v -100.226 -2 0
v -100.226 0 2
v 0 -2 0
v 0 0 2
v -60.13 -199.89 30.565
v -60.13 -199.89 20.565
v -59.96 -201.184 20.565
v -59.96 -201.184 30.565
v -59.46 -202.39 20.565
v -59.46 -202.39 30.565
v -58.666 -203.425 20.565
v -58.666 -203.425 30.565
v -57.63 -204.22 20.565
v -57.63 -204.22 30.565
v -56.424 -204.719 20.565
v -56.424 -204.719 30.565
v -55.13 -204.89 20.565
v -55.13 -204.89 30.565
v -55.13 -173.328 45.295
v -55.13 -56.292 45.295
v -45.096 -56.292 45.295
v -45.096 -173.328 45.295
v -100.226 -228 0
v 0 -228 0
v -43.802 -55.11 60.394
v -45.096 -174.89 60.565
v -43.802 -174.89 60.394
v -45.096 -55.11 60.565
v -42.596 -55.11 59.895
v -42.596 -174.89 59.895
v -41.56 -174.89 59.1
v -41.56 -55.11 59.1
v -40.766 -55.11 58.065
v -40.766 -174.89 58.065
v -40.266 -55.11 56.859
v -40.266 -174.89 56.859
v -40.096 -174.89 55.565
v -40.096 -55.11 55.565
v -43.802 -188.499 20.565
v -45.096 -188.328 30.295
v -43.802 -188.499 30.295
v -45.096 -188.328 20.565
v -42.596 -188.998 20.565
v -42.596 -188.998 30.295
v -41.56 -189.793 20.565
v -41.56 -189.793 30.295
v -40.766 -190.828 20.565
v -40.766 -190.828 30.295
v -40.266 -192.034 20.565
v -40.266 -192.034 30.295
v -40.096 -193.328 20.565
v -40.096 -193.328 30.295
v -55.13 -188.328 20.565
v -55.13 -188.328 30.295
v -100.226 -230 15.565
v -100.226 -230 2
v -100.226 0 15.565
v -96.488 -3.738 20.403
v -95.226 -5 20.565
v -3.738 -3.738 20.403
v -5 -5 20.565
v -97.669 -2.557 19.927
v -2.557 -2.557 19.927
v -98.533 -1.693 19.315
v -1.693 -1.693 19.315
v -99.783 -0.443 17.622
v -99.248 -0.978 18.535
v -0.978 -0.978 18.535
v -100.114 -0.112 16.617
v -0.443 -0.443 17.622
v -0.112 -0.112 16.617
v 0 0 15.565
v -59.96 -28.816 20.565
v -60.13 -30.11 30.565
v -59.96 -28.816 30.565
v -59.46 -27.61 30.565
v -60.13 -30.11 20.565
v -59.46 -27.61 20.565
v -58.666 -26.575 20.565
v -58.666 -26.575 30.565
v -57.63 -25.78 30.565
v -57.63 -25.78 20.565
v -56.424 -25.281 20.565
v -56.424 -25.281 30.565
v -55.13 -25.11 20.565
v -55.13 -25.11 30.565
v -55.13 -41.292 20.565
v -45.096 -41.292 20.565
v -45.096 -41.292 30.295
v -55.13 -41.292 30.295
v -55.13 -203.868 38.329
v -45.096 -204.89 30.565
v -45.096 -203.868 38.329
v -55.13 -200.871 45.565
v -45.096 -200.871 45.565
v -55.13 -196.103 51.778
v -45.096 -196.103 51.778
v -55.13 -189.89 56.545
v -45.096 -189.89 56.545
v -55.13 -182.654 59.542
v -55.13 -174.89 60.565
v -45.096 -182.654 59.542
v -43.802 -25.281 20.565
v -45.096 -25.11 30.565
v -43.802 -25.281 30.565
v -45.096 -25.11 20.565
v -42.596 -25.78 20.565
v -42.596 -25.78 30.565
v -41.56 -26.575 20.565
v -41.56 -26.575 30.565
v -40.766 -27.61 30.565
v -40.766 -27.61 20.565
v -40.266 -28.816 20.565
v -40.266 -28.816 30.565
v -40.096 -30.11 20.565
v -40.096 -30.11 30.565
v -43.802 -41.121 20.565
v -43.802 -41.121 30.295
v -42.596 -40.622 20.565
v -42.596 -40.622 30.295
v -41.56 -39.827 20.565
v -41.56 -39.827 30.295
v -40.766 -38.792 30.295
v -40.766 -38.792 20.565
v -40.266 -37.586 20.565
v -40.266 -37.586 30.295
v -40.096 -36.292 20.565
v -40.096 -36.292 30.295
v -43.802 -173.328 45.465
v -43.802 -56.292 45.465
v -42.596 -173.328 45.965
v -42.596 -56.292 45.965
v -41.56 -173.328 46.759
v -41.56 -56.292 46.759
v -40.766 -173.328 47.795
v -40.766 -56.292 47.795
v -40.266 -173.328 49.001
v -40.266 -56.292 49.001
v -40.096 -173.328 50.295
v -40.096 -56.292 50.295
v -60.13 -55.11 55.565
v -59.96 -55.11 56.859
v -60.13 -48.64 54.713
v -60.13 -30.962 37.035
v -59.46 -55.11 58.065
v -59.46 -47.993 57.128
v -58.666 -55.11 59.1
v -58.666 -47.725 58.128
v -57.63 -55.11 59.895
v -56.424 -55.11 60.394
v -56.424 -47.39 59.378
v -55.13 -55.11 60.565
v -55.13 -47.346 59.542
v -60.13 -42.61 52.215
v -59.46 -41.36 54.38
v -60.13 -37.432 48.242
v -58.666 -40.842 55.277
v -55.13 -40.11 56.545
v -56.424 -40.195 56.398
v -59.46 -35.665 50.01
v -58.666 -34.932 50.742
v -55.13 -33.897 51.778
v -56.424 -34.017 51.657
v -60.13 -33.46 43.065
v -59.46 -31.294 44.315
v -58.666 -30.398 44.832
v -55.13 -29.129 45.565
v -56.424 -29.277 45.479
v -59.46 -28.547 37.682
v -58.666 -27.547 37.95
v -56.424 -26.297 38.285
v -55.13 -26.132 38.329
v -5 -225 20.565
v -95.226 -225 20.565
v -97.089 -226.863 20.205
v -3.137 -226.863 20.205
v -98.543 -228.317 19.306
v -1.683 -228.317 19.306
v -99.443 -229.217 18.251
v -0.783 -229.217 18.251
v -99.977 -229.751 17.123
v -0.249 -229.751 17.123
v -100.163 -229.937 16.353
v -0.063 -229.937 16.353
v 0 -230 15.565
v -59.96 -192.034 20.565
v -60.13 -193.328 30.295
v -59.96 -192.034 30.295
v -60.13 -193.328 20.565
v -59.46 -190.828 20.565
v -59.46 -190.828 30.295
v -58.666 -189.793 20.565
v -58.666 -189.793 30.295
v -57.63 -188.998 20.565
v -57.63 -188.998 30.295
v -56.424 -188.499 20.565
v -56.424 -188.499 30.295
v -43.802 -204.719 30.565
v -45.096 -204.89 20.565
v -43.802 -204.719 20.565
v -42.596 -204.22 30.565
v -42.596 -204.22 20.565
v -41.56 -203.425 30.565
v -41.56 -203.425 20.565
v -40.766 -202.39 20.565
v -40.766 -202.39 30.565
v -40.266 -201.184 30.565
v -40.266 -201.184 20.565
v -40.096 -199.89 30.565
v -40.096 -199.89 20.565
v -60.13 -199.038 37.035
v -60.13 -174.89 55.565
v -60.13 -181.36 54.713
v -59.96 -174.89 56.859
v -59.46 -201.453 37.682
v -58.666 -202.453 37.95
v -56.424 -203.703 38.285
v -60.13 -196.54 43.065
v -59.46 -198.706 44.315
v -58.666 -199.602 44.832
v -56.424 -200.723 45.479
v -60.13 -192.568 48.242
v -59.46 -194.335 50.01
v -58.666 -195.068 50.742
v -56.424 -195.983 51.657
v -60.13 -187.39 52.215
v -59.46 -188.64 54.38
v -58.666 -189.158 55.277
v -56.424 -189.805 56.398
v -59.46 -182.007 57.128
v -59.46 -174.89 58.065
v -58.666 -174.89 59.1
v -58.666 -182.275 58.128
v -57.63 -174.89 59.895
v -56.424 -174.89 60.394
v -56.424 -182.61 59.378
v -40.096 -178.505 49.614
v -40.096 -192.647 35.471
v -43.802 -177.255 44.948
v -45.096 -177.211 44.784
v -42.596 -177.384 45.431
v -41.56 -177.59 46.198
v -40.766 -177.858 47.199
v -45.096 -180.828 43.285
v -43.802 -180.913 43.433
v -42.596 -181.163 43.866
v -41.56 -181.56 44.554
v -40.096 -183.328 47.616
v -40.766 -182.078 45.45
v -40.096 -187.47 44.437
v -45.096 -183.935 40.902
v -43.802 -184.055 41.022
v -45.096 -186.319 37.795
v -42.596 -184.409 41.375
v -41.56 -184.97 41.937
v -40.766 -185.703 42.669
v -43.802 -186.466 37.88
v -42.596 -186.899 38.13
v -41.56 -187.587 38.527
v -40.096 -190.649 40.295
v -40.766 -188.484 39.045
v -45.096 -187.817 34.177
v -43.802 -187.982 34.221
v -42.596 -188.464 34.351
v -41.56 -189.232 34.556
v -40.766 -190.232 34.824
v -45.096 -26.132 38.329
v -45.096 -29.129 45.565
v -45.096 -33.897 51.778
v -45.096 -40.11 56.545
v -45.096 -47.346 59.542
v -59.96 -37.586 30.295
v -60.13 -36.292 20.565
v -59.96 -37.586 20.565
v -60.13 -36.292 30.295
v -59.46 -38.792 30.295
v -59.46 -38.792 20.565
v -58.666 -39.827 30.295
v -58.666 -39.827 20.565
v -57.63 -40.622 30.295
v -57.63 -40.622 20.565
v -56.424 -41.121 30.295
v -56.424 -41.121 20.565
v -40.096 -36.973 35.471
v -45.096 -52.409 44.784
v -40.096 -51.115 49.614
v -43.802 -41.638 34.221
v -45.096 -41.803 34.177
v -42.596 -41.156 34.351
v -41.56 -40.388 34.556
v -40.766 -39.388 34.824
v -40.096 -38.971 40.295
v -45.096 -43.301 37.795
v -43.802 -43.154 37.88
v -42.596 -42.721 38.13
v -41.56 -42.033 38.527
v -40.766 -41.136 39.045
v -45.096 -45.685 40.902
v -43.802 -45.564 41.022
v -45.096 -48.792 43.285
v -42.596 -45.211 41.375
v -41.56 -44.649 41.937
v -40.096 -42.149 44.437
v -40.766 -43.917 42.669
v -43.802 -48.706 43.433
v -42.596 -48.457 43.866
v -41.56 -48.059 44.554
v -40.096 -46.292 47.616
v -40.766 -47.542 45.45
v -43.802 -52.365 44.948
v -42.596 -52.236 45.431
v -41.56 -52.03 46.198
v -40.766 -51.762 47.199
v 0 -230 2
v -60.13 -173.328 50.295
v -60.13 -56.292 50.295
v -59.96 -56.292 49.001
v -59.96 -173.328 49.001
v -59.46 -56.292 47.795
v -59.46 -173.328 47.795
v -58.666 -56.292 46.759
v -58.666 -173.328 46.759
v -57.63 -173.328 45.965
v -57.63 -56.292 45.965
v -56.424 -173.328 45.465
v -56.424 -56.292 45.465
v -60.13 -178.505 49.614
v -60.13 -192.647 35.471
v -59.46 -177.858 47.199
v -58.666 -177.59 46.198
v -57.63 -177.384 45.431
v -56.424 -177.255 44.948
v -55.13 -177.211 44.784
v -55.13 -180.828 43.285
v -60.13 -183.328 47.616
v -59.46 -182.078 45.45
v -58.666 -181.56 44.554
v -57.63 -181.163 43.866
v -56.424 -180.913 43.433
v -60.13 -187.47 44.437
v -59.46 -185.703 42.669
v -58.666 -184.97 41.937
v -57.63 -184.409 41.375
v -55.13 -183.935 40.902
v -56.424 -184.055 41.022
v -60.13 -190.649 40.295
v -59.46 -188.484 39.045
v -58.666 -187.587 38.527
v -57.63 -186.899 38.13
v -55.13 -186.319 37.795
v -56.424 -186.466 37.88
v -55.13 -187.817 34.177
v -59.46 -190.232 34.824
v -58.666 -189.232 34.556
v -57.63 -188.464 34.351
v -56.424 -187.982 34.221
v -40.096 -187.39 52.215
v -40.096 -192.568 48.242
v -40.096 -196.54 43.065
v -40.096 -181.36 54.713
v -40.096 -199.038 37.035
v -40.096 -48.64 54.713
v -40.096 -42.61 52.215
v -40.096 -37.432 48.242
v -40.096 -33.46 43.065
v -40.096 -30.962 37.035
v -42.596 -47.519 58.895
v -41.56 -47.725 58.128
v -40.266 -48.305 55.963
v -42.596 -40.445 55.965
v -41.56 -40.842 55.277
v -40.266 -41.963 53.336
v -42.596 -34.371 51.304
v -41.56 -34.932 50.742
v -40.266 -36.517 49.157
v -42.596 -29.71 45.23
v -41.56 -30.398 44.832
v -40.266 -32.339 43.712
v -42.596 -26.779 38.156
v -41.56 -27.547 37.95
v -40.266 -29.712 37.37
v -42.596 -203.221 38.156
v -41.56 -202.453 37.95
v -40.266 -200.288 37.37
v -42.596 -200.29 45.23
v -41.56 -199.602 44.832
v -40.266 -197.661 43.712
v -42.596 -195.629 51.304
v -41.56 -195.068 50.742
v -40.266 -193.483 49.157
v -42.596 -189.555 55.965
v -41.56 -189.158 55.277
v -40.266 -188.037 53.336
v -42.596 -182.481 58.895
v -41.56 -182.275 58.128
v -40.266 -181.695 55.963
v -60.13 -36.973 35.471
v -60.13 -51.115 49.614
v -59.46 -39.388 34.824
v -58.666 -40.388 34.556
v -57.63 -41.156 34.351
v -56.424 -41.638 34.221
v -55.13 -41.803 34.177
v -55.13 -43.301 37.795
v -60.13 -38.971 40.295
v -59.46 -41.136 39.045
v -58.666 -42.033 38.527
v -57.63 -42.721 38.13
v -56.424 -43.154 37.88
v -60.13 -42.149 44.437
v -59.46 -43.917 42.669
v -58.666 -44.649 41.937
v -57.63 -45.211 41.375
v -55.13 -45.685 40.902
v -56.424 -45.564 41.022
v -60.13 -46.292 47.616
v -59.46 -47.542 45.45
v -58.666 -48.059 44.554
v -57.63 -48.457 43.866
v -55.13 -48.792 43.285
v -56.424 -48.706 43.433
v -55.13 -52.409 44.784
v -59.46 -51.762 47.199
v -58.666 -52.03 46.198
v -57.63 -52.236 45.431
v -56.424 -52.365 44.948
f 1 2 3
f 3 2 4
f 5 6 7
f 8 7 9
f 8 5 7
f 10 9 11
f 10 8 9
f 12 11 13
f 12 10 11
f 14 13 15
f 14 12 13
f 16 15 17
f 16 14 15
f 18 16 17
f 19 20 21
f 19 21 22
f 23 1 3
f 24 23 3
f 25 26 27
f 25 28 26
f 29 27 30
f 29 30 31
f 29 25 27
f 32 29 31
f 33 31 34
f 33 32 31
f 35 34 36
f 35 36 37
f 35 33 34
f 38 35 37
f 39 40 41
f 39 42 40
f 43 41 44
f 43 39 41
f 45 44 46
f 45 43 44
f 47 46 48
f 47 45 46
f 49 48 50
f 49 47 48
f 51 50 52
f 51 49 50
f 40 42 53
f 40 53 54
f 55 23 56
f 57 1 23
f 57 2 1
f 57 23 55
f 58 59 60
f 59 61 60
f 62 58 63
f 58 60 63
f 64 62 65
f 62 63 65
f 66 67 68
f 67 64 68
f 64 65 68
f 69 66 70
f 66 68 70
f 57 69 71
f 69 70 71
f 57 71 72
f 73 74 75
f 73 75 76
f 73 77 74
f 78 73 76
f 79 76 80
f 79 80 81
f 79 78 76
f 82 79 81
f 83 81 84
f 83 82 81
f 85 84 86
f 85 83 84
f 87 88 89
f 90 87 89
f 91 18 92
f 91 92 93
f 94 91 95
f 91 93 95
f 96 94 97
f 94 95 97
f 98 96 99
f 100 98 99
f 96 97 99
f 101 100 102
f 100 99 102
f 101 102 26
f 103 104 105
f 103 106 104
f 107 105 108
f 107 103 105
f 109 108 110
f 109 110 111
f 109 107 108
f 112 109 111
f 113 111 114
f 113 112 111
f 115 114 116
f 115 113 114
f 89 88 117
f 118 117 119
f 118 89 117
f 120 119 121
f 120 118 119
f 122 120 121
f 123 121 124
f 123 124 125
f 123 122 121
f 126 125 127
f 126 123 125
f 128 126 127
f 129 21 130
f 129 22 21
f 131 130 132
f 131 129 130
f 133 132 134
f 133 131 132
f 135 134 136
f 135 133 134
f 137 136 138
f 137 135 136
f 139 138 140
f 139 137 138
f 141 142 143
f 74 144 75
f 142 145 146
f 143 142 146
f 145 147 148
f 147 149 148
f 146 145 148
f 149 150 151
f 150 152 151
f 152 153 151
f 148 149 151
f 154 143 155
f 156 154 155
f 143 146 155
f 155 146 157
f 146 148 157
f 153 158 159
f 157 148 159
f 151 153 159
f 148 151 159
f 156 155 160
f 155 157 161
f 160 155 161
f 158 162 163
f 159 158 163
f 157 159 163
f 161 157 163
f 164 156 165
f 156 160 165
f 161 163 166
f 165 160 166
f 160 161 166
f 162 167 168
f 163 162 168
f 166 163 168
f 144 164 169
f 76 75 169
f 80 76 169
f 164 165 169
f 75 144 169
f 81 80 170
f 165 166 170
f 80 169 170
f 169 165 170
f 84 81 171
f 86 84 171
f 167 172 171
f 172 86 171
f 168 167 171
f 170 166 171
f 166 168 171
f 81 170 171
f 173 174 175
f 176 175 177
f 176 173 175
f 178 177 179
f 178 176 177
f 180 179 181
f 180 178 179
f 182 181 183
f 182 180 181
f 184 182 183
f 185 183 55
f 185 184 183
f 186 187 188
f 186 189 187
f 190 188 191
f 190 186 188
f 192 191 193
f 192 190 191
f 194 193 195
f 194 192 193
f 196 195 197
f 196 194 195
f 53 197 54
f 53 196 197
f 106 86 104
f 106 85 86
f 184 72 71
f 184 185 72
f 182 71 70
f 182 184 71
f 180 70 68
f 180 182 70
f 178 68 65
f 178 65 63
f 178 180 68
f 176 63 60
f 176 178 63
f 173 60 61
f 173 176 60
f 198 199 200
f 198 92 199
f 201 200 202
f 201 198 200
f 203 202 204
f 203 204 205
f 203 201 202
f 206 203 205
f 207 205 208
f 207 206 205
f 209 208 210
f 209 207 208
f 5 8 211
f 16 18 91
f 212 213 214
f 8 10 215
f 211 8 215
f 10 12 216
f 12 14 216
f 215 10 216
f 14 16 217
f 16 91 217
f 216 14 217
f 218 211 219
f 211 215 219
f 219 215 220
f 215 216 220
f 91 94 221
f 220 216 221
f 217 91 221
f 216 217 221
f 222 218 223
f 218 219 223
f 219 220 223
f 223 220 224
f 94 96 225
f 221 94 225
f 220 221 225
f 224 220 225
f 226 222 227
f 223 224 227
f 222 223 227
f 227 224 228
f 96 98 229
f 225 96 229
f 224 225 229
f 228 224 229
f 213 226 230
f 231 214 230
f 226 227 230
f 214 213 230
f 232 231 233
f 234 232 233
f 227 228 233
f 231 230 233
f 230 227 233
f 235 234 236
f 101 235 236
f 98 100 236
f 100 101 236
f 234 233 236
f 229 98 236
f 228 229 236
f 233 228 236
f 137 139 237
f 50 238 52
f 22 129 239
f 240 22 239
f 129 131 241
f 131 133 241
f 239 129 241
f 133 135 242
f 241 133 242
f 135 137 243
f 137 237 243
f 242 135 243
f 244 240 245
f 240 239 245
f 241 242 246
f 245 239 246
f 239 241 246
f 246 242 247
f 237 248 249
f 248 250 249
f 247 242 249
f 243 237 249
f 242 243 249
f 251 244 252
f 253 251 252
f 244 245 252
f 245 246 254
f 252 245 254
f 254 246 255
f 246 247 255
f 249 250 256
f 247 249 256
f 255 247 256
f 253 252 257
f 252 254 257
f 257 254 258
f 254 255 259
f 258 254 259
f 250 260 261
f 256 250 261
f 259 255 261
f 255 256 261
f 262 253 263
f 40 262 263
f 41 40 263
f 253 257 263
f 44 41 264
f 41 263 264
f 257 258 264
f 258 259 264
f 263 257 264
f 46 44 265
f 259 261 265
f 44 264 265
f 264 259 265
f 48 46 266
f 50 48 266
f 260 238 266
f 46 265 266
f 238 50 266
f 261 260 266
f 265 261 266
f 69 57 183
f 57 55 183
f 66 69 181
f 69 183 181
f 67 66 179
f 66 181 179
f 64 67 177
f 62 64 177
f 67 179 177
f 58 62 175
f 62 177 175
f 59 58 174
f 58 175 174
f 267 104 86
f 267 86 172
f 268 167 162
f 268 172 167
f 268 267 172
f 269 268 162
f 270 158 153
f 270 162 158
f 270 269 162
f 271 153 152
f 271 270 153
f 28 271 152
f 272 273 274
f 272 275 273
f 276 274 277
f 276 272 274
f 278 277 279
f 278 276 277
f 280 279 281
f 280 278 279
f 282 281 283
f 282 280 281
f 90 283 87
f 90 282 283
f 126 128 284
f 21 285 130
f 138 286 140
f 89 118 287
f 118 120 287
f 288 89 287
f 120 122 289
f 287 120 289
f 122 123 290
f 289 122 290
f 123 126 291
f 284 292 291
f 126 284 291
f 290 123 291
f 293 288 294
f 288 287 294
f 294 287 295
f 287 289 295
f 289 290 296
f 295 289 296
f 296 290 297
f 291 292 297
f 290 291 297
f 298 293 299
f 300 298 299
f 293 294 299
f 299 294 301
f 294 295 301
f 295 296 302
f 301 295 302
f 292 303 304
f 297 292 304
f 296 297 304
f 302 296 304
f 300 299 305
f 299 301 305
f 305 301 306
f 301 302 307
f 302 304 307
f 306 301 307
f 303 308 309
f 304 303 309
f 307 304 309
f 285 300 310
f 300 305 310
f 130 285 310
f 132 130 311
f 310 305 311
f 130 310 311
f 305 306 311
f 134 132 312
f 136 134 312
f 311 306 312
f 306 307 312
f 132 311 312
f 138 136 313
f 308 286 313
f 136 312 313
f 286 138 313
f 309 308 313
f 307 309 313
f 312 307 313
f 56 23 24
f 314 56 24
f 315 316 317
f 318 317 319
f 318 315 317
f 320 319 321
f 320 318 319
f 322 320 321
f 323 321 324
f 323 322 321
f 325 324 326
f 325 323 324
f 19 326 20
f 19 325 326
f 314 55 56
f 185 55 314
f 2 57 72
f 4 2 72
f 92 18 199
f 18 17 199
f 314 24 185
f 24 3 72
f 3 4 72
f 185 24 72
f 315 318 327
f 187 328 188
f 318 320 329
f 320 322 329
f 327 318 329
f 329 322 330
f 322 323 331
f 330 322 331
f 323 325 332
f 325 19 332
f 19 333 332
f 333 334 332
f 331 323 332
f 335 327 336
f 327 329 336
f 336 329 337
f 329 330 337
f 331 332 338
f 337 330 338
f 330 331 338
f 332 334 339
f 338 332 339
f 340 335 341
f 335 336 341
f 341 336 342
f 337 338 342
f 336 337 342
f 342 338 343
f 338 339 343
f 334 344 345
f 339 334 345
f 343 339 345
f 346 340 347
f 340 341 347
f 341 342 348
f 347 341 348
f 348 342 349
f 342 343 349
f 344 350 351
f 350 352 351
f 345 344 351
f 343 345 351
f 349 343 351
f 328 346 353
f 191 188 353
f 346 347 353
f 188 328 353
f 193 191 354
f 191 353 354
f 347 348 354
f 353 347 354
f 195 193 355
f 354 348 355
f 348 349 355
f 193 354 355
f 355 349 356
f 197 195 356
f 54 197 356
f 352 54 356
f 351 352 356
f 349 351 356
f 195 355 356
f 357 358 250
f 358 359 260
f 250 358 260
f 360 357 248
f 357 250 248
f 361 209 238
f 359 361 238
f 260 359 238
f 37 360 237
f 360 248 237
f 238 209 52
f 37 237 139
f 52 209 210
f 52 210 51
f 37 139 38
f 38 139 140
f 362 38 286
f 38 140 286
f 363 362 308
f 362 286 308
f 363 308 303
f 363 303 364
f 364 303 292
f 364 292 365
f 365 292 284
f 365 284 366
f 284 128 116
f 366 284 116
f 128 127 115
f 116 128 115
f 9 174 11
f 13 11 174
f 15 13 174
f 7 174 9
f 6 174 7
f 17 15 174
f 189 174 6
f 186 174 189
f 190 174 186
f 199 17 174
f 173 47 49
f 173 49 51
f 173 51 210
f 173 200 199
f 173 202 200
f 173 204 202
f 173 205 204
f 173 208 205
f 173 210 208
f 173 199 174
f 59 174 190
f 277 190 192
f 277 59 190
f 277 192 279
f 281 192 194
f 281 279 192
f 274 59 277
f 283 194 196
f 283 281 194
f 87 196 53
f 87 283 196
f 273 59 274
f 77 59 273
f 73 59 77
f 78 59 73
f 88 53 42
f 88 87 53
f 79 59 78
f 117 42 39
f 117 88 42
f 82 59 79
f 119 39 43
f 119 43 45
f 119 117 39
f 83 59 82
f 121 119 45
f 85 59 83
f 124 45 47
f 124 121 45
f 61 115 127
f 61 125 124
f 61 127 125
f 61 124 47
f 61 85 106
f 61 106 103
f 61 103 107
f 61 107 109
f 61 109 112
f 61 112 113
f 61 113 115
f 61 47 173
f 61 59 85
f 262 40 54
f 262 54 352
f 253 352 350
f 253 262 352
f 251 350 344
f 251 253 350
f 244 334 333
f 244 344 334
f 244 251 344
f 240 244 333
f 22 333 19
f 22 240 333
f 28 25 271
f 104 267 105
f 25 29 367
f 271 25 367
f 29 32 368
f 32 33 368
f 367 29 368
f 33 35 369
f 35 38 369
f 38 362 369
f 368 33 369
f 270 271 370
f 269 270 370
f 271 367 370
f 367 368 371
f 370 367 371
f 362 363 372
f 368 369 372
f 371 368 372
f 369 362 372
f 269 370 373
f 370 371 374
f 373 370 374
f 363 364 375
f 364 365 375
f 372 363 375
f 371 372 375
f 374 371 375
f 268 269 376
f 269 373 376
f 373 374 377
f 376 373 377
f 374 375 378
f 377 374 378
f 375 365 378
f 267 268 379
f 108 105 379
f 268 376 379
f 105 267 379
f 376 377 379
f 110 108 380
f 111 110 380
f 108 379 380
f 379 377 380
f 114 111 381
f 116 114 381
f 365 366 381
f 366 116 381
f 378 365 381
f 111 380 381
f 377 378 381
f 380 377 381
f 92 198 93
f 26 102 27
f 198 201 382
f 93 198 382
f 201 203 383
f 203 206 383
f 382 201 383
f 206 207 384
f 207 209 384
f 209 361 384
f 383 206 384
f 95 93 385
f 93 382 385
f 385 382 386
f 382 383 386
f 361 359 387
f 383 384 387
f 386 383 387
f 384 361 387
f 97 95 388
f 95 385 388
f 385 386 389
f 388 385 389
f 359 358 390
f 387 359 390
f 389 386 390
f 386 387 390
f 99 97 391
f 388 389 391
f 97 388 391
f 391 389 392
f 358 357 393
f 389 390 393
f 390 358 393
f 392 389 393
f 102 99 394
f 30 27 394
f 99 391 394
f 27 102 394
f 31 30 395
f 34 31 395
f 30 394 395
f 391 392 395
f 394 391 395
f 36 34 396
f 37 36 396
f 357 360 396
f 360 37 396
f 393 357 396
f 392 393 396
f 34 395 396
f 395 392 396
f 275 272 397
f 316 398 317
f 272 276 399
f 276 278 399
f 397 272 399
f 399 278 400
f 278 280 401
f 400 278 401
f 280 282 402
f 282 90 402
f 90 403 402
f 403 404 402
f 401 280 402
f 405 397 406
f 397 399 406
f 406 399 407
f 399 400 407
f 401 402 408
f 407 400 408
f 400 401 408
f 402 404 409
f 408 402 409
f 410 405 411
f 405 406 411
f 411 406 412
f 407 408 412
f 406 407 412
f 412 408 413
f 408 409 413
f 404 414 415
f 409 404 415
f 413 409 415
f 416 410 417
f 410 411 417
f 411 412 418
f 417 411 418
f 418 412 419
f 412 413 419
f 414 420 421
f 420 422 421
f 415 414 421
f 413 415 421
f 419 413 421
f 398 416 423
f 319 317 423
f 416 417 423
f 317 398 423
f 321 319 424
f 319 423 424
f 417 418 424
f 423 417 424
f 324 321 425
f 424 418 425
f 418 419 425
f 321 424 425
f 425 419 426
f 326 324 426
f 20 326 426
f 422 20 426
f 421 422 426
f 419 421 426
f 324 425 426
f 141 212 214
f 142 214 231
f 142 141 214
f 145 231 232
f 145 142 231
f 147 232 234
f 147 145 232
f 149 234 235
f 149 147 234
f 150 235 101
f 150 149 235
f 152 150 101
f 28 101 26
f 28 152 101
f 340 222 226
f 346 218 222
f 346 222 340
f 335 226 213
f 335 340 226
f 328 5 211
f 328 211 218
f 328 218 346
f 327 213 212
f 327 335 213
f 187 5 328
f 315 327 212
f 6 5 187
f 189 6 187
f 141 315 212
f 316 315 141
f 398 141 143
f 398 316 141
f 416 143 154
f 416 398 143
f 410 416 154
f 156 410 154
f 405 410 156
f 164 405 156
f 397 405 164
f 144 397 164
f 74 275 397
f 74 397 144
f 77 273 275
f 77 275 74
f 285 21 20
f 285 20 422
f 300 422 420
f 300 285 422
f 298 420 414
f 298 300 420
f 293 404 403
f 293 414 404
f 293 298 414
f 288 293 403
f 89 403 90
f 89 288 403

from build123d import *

# Parameters (mm, degrees)
F0_W     = 100.2259999514
F0_H     = 20.5646064132
F1_DEPTH = 230
F2_R     = 5
F3_W     = 20.0339406729
F3_H     = 179.7797265649
F4_DEPTH = 40
F5_R     = 30
F6_W     = 147.0367200673
F6_H     = 24.7304122895
F7_DEPTH = 25
F8_R     = 15
F9_R     = 5
F10_SIZE = 2
F11_SIZE = 2


with BuildPart() as f1:
    # F0 (on Front) → F1 (new body)
    with BuildSketch(Plane.XZ):
        with Locations((-50.1129999757, 10.2823032066)):
            Rectangle(F0_W, F0_H)
    extrude(amount=F1_DEPTH)

    # F2
    f2_edges = [f1.edges().sort_by_distance(p)[0] for p in [
        (-50.113, -230, 20.564606),
        (0, -115, 20.564606),
        (-100.226, -115, 20.564606),
        (-50.113, 0, 20.564606),
    ]]
    fillet(f2_edges, radius=F2_R)

    # F3 (on face) → F4 (join)
    with BuildSketch(Plane.XY.offset(20.5646064132)):
        with Locations((-50.1129999757, -115)):
            Rectangle(F3_W, F3_H)
    extrude(amount=F4_DEPTH)

    # F5
    f5_edges = [f1.edges().sort_by_distance(p)[0] for p in [
        (-50.113, -25.110137, 60.564606),
        (-50.113, -204.889863, 60.564606),
    ]]
    fillet(f5_edges, radius=F5_R)

    # F6 (on face) → F7 (cut)
    with BuildSketch(Plane(origin=(-60.1299703121, 0, 0), x_dir=(0, -1, 0), z_dir=(-1, 0, 0))):
        with Locations((114.8098763078, 32.929812558)):
            Rectangle(F6_W, F6_H)
    extrude(amount=-F7_DEPTH, mode=Mode.SUBTRACT)

    # F8
    f8_edges = [f1.edges().sort_by_distance(p)[0] for p in [
        (-50.113, -188.328236, 45.295019),
        (-50.113, -41.291516, 45.295019),
    ]]
    fillet(f8_edges, radius=F8_R)

    # F9
    f9_edges = [f1.edges().sort_by_distance(p)[0] for p in [
        (-60.12997, -115, 60.564606),
        (-60.12997, -33.896933, 51.77781),
        (-60.12997, -114.809876, 45.295019),
        (-60.12997, -45.684915, 40.90162),
        (-60.12997, -183.934838, 40.90162),
        (-40.09603, -115, 60.564606),
        (-40.09603, -196.103067, 51.77781),
        (-40.09603, -114.809876, 45.295019),
    ]]
    fillet(f9_edges, radius=F9_R)

    # F10
    f10_edges = [f1.edges().sort_by_distance(p)[0] for p in [
        (-50.113, -230, 0),
    ]]
    chamfer(f10_edges, length=F10_SIZE)

    # F11
    f11_edges = [f1.edges().sort_by_distance(p)[0] for p in [
        (-50.113, 0, 0),
    ]]
    chamfer(f11_edges, length=F11_SIZE)


solid = f1.part
